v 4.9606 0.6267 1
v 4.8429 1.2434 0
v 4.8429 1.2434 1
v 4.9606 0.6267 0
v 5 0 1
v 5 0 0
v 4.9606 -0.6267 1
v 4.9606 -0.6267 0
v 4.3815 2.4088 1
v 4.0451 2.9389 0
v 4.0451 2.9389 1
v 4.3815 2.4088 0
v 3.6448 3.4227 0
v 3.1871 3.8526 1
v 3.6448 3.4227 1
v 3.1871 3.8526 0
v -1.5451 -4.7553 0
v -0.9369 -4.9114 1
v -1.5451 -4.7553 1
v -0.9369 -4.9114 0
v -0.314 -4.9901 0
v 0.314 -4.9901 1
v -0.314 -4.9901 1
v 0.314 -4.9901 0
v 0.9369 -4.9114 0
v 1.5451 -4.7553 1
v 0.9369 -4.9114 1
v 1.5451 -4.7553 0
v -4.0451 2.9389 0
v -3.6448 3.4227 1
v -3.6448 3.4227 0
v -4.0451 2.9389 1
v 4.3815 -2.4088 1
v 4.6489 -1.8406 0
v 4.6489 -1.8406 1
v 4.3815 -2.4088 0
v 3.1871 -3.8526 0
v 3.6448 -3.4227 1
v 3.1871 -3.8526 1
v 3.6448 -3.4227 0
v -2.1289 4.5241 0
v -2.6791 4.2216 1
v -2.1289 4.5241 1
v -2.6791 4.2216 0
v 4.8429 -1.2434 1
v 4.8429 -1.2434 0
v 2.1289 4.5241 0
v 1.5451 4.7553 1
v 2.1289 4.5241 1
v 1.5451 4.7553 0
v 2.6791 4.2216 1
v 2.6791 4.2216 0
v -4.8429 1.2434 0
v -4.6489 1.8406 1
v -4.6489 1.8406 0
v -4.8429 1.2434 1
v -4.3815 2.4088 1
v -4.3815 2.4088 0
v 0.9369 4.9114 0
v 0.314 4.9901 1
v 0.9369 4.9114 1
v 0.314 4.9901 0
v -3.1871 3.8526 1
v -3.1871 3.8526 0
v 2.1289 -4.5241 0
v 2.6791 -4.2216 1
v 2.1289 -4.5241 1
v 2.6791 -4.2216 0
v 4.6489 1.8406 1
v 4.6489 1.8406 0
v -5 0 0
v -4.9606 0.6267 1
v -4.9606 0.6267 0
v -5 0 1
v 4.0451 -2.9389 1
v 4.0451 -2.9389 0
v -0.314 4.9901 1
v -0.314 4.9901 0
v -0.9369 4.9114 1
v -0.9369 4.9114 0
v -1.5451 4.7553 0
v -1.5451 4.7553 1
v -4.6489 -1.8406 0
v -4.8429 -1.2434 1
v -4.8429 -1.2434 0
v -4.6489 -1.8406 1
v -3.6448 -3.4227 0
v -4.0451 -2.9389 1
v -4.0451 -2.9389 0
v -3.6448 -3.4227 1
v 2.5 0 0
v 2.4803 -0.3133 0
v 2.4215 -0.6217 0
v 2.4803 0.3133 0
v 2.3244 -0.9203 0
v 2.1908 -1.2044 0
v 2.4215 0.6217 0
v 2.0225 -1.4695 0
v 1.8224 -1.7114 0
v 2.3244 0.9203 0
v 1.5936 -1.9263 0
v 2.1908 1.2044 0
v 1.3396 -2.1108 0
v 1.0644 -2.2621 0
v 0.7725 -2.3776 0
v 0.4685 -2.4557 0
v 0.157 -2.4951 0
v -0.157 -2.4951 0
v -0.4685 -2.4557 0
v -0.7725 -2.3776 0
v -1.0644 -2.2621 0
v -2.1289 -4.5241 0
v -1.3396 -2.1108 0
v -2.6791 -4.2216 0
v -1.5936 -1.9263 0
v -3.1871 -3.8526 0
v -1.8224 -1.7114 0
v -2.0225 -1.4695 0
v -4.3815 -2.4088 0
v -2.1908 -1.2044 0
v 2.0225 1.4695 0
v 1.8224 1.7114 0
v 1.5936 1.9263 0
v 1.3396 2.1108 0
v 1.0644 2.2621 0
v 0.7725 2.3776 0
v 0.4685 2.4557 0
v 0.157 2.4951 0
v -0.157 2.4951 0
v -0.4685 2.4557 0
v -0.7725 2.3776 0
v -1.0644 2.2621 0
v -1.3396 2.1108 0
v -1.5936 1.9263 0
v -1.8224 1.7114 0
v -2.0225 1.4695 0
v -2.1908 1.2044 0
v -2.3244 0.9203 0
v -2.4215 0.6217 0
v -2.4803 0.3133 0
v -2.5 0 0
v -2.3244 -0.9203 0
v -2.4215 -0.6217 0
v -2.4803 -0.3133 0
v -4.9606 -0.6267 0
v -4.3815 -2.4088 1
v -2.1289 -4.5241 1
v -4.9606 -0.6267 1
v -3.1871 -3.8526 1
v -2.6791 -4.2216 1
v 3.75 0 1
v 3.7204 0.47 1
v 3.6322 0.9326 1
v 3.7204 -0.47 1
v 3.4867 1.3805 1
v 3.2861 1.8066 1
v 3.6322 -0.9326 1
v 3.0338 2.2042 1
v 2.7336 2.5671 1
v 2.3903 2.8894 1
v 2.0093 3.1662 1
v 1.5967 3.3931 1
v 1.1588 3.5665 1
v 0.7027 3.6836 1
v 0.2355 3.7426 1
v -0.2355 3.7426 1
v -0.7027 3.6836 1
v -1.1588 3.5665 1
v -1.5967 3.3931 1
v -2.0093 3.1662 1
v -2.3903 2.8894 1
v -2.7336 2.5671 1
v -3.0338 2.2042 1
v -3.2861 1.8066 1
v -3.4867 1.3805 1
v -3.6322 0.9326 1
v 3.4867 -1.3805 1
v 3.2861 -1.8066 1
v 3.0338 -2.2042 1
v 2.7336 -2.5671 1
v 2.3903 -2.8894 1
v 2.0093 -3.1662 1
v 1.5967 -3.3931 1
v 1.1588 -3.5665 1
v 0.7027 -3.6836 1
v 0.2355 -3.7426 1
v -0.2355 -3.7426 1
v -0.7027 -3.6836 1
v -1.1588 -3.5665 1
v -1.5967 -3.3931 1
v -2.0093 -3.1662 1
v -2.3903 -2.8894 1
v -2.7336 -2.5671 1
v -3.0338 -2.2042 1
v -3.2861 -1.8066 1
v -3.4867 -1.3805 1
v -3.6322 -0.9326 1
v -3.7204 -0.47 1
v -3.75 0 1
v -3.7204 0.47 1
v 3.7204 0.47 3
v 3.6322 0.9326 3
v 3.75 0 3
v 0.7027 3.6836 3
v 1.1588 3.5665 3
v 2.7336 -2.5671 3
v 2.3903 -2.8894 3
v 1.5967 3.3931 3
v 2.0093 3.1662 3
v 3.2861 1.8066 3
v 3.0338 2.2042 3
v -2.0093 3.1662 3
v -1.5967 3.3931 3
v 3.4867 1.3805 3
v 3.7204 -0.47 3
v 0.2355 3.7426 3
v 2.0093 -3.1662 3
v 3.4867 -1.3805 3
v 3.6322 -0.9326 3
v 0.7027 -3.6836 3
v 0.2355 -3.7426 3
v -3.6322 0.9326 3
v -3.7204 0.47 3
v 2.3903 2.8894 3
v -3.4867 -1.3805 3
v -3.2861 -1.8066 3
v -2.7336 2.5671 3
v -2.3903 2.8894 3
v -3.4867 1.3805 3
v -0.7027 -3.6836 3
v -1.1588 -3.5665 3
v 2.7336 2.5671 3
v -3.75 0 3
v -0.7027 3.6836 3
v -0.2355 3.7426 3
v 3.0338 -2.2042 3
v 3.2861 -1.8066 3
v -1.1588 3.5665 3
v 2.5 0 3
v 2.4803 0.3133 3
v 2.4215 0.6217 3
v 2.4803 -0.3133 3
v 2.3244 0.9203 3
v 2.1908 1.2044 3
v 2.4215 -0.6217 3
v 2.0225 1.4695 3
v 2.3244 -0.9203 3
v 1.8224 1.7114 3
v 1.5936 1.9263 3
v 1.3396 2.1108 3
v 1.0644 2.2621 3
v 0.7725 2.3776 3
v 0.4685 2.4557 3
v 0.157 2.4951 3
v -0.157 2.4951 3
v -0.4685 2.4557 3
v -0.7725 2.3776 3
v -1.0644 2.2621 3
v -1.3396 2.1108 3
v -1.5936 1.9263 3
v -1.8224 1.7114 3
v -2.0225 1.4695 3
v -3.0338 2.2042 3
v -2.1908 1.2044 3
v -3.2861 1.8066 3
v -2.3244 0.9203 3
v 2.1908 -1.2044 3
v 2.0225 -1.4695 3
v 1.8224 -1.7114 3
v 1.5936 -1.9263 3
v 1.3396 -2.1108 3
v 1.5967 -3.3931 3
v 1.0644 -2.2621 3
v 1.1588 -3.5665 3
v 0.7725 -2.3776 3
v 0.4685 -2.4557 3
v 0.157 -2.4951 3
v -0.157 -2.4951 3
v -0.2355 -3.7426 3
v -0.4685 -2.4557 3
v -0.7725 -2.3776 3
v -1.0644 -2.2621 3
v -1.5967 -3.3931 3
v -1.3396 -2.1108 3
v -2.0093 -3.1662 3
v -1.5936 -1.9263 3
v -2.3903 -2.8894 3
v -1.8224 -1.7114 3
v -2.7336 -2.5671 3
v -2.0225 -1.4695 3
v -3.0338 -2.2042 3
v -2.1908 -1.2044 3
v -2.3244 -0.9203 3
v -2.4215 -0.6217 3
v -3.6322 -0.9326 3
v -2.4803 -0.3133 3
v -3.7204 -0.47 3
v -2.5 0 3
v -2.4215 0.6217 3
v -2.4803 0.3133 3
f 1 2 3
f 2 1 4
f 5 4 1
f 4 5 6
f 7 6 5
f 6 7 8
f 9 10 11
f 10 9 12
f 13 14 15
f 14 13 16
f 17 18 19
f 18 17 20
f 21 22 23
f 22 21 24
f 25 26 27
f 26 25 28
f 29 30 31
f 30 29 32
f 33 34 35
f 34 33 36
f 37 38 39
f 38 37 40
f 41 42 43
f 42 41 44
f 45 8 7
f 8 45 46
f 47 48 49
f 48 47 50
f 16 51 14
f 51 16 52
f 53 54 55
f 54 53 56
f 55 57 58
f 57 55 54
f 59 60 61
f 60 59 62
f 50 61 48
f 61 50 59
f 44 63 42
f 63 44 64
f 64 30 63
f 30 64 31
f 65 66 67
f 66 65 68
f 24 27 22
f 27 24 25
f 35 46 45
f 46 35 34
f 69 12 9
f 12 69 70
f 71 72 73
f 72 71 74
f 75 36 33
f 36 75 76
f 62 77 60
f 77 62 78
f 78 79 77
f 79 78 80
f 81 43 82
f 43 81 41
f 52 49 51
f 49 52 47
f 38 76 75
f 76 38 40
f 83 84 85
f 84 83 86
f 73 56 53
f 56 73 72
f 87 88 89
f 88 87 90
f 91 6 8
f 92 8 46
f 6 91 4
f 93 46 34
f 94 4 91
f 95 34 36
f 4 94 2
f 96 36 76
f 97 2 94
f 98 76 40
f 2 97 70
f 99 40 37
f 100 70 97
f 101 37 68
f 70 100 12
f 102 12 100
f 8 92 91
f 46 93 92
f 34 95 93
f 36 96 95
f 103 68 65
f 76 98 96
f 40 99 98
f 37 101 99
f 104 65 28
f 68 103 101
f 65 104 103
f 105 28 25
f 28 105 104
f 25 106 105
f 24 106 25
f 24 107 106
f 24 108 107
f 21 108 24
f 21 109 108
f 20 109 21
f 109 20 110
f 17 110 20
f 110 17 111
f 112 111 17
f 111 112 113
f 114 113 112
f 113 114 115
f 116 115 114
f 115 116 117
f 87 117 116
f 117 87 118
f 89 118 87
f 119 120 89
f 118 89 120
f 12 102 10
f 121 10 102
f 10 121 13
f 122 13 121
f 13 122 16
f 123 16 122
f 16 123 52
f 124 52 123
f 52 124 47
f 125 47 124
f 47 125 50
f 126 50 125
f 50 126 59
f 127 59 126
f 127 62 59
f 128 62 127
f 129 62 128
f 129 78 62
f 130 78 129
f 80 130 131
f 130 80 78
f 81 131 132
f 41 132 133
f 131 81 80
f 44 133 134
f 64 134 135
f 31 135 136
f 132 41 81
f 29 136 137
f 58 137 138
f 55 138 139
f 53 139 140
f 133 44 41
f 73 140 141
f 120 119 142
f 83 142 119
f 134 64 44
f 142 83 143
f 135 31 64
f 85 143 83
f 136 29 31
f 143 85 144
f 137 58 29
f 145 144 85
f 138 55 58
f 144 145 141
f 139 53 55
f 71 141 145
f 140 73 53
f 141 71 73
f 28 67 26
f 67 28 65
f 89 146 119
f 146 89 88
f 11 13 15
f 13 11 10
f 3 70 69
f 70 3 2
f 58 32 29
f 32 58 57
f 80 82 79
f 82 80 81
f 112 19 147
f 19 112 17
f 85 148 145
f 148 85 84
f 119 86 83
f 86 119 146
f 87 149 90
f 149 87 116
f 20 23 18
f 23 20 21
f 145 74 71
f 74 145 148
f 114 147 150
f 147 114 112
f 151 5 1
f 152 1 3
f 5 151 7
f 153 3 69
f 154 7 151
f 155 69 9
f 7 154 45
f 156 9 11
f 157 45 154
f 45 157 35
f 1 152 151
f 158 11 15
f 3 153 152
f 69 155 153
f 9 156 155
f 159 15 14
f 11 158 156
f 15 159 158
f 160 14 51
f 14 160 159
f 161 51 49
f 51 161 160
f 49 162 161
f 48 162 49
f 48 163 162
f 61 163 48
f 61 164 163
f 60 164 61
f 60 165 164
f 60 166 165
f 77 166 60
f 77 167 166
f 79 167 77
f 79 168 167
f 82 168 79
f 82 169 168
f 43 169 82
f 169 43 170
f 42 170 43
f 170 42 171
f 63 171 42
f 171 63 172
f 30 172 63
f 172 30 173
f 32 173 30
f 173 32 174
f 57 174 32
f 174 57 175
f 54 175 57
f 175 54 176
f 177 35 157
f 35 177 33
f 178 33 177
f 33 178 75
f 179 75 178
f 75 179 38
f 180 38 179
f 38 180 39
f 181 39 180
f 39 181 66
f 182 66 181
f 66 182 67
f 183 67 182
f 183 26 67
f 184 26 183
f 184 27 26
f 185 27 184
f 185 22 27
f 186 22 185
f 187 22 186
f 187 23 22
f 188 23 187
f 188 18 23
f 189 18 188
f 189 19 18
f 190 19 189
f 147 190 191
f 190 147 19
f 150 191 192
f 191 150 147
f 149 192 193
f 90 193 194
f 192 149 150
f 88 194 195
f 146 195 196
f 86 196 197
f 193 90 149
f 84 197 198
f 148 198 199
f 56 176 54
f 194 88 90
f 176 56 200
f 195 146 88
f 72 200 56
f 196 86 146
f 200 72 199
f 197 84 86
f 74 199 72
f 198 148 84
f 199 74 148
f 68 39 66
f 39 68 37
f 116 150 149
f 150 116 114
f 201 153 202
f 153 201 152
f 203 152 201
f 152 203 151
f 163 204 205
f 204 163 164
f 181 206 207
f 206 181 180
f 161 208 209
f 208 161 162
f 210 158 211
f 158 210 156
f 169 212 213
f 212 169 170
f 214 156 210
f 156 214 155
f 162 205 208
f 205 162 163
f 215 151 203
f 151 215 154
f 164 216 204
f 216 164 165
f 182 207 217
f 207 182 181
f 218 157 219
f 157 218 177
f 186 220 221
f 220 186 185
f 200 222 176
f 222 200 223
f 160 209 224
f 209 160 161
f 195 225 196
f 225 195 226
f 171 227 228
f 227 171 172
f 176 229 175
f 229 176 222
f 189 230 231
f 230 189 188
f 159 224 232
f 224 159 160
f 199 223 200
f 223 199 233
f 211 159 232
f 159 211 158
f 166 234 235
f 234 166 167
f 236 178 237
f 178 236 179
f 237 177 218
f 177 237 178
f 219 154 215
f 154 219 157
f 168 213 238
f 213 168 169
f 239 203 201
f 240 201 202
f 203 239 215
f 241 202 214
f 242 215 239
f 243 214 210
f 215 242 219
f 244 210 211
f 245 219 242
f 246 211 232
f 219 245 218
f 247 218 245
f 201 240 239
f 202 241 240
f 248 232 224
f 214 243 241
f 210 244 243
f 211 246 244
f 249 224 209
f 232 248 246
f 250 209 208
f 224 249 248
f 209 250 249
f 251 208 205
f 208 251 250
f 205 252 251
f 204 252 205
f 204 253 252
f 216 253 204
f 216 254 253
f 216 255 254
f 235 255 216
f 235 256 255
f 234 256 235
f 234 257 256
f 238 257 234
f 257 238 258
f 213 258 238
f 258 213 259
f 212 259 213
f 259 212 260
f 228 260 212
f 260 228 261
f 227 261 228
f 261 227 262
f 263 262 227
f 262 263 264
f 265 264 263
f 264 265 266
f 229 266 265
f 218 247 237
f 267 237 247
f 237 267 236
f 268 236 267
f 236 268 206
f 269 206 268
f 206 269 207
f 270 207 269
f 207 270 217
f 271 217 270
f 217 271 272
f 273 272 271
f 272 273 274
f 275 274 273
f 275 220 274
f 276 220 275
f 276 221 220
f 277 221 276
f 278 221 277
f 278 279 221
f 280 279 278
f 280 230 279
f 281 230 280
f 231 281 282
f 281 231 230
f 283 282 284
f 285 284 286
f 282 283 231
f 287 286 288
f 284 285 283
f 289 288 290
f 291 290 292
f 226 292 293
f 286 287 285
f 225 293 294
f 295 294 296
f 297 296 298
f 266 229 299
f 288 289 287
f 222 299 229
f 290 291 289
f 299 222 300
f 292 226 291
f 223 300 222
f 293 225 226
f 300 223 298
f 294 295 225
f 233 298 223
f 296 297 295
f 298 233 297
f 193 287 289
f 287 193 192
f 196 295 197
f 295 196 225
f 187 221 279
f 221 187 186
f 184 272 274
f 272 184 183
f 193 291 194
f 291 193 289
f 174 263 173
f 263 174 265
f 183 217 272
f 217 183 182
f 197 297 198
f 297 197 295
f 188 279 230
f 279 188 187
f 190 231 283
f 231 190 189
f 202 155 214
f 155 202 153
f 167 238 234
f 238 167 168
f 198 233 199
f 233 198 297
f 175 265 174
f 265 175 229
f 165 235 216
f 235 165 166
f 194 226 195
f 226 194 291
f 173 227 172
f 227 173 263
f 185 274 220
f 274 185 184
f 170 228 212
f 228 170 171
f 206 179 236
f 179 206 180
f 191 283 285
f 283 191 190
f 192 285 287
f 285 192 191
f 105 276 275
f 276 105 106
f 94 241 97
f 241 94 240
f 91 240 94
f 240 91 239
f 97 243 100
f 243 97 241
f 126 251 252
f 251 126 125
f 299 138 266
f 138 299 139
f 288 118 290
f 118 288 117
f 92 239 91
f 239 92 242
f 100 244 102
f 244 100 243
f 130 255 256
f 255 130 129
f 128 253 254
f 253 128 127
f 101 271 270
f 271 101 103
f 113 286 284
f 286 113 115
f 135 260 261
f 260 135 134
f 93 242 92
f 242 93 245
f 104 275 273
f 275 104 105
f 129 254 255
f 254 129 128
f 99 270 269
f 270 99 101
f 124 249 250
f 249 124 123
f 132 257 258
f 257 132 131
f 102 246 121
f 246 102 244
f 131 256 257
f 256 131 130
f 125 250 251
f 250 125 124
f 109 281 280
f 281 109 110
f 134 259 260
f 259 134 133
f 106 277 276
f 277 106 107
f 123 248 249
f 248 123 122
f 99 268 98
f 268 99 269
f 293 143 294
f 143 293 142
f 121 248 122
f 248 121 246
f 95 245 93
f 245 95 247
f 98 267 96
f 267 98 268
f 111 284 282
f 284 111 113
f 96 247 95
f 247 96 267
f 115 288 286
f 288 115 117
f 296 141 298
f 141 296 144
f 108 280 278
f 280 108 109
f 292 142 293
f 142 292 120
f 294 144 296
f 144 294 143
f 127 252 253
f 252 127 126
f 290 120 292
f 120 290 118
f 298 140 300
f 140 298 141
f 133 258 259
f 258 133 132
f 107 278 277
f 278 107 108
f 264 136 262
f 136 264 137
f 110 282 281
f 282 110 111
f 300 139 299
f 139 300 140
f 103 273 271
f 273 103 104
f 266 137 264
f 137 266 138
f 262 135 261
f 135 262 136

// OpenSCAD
/*************************************************************************** 
Spring seat to maintain spring alignment and even pressure when compressed.
Author: Mike Thompson (thingyverse: mike_linus)
Date Last Modified: 16/03/2013
Description: change the variable values to print an inside or outside seat of the required dimensions.  The inside seat is more compact for tighter spaces.  The outside version hides the base of the spring for but looks chunkier.
****************************************************************************/

/*globals*/
resolution=50;
bolt_hole_radius=2.5;
seat_radius=5;
support_height=3;
//"inside" or "outside"
seat_type="inside";
thickness=1;

$fn=resolution;

module base(){
	cylinder(r=seat_radius,h=thickness);
	cylinder(r=seat_radius-thickness-0.25,h=support_height);
}

if (seat_type=="inside"){
	difference(){
		base();
		cylinder(r=bolt_hole_radius,h=support_height);
	}
}
else {
	difference(){
		cylinder(r=seat_radius+thickness,h=support_height);
		translate([0,0,thickness])cylinder(r=seat_radius,h=support_height);
		cylinder(r=bolt_hole_radius,h=support_height);
	}
}
